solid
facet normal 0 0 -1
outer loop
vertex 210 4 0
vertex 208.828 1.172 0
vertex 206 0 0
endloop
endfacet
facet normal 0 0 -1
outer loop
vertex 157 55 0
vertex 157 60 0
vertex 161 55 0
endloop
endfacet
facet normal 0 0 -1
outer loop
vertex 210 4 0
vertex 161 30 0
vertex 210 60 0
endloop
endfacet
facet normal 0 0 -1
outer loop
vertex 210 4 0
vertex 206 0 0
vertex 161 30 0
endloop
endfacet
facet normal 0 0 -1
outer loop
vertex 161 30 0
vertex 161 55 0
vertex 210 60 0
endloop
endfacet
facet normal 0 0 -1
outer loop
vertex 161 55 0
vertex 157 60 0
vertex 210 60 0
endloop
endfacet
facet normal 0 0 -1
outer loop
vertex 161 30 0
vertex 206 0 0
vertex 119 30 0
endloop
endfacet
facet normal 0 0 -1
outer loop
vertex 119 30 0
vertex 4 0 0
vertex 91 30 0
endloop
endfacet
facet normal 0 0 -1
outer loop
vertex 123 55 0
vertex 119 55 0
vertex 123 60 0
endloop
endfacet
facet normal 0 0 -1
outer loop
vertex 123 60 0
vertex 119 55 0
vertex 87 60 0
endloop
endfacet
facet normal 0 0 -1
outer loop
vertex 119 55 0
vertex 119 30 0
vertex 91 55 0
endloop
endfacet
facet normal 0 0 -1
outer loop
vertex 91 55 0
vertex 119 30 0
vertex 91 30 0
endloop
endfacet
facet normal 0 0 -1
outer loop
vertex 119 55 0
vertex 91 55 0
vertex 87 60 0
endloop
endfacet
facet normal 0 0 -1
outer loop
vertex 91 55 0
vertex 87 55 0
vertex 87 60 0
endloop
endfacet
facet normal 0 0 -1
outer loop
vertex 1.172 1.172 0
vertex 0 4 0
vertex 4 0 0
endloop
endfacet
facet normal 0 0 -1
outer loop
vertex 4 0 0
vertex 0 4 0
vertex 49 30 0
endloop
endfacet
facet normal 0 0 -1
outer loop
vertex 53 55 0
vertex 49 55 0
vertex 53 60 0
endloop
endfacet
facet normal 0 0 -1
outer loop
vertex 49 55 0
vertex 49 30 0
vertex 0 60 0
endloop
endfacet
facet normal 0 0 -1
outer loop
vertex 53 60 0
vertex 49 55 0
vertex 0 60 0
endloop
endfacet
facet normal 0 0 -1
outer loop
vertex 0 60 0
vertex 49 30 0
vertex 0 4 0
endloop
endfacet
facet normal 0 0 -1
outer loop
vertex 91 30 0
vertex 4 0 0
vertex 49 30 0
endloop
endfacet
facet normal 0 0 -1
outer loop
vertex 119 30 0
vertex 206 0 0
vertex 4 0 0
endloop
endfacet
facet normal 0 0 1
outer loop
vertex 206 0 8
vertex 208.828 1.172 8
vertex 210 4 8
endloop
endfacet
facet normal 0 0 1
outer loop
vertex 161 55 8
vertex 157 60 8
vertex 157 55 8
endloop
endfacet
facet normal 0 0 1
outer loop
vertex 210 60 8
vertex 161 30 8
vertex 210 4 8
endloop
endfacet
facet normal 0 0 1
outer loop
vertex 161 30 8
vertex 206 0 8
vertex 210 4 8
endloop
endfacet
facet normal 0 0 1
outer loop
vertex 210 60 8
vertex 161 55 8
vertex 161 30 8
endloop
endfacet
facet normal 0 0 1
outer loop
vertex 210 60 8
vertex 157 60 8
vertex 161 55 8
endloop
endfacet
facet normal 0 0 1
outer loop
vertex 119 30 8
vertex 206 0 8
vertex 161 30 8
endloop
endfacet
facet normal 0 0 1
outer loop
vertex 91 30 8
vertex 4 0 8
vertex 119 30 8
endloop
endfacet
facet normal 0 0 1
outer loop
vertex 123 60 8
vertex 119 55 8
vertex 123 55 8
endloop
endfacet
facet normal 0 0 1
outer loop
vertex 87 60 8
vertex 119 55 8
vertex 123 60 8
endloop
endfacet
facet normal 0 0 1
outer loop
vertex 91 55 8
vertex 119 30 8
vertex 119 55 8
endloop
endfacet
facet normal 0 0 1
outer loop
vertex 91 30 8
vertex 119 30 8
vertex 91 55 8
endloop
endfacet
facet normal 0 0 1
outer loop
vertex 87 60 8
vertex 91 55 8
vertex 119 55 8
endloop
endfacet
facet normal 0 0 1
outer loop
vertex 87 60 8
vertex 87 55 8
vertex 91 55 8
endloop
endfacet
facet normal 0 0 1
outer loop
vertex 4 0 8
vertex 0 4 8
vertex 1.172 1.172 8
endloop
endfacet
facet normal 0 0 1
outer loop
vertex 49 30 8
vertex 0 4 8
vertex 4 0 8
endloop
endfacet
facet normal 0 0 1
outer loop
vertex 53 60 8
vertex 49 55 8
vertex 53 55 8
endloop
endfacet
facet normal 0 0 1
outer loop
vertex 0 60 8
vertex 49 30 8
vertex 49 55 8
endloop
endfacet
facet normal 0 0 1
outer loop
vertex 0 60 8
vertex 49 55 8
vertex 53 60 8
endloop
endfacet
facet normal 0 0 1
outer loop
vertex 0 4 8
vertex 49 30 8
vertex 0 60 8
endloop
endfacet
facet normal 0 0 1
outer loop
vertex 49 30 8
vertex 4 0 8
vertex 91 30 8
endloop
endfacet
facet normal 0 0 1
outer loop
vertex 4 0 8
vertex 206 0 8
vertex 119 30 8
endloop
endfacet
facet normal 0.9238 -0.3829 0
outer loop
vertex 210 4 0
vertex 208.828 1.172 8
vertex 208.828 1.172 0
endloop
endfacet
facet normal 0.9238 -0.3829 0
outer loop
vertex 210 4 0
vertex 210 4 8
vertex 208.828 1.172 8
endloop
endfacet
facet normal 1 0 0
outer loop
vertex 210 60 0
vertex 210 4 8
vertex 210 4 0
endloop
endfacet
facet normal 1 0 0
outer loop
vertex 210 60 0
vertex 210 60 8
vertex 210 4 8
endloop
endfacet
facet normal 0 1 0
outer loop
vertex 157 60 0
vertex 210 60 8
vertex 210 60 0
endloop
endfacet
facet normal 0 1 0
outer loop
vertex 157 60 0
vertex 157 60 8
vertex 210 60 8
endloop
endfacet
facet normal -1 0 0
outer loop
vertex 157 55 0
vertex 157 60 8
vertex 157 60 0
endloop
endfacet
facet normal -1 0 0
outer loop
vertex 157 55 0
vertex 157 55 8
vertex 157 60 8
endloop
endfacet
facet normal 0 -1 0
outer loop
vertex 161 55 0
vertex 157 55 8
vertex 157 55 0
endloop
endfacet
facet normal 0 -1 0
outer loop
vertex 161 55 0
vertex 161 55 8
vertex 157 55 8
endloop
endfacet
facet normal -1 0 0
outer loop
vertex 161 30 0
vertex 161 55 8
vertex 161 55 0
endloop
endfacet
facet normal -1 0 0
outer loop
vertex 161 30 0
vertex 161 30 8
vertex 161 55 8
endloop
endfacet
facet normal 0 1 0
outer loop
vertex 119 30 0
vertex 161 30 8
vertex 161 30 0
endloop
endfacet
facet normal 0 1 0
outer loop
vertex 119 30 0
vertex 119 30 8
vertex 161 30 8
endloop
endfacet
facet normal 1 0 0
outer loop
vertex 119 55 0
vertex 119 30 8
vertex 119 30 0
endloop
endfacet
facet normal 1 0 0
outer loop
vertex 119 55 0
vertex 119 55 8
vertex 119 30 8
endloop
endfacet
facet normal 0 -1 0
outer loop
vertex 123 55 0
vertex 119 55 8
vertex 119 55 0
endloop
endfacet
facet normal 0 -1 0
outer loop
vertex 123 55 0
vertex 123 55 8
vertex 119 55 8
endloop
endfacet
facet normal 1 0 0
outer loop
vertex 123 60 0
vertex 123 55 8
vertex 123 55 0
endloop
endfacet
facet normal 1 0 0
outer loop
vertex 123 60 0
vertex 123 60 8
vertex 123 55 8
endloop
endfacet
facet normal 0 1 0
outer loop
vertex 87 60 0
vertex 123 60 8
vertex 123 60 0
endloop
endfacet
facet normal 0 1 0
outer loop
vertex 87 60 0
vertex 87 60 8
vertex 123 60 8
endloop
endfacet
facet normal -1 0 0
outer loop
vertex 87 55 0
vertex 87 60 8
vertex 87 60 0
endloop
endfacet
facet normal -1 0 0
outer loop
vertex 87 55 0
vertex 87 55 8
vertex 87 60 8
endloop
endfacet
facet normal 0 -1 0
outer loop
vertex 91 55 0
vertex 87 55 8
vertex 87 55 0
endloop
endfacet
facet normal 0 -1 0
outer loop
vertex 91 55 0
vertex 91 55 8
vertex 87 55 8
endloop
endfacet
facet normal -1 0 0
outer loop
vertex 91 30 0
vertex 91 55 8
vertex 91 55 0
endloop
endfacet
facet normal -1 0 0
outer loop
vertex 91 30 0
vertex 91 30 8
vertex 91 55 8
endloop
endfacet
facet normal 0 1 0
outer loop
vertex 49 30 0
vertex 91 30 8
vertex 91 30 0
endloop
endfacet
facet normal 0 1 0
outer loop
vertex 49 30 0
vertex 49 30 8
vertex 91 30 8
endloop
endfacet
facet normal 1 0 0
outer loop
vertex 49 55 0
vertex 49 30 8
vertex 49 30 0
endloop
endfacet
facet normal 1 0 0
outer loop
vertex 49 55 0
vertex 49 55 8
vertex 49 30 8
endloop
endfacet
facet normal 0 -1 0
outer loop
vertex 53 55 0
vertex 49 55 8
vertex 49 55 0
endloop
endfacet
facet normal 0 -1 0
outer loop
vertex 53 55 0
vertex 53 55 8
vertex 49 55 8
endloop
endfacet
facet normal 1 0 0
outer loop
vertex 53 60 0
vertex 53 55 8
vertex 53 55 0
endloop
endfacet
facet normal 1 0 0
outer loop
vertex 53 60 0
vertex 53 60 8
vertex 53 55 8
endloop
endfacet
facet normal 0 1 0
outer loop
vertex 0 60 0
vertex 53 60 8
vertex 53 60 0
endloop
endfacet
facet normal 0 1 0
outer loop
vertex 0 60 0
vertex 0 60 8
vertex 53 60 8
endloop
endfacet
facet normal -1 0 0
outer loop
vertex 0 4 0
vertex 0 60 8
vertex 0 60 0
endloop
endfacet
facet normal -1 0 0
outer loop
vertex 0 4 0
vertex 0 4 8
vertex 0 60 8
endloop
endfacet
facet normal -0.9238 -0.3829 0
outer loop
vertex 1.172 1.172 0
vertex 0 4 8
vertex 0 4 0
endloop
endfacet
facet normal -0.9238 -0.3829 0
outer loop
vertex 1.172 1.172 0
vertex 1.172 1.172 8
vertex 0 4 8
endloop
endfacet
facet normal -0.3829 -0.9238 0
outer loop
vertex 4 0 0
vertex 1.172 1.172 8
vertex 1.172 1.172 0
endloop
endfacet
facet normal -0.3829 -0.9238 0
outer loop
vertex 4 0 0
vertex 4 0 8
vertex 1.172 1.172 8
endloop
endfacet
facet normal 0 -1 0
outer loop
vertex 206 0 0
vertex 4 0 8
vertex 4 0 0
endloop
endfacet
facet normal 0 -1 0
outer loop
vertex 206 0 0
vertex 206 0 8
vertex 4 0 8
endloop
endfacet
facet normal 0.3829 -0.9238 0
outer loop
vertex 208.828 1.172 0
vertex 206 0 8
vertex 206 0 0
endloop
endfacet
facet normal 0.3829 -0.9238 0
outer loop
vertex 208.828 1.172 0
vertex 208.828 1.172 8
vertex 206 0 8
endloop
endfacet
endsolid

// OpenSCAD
$fn = 32;

// ----------------------------------------------------------------------
// Oversize slot bar: 210 mm bar with 2 oversize windows
// ----------------------------------------------------------------------

// --- parameters (mm) ---
profile_height = 8;       // extrusion height
profile_points = 24;      // points of the closed outline

profile = [[0, 4], [1.172, 1.172], [4, 0], [206, 0], [208.828, 1.172], [210, 4], [210, 60], [157, 60], [157, 55], [161, 55], [161, 30], [119, 30], [119, 55], [123, 55], [123, 60], [87, 60], [87, 55], [91, 55], [91, 30], [49, 30], [49, 55], [53, 55], [53, 60], [0, 60]];  // single closed polygon, 24 points, counter clockwise

// --- the one profile operation ---
linear_extrude(height = profile_height) polygon(points = profile);
